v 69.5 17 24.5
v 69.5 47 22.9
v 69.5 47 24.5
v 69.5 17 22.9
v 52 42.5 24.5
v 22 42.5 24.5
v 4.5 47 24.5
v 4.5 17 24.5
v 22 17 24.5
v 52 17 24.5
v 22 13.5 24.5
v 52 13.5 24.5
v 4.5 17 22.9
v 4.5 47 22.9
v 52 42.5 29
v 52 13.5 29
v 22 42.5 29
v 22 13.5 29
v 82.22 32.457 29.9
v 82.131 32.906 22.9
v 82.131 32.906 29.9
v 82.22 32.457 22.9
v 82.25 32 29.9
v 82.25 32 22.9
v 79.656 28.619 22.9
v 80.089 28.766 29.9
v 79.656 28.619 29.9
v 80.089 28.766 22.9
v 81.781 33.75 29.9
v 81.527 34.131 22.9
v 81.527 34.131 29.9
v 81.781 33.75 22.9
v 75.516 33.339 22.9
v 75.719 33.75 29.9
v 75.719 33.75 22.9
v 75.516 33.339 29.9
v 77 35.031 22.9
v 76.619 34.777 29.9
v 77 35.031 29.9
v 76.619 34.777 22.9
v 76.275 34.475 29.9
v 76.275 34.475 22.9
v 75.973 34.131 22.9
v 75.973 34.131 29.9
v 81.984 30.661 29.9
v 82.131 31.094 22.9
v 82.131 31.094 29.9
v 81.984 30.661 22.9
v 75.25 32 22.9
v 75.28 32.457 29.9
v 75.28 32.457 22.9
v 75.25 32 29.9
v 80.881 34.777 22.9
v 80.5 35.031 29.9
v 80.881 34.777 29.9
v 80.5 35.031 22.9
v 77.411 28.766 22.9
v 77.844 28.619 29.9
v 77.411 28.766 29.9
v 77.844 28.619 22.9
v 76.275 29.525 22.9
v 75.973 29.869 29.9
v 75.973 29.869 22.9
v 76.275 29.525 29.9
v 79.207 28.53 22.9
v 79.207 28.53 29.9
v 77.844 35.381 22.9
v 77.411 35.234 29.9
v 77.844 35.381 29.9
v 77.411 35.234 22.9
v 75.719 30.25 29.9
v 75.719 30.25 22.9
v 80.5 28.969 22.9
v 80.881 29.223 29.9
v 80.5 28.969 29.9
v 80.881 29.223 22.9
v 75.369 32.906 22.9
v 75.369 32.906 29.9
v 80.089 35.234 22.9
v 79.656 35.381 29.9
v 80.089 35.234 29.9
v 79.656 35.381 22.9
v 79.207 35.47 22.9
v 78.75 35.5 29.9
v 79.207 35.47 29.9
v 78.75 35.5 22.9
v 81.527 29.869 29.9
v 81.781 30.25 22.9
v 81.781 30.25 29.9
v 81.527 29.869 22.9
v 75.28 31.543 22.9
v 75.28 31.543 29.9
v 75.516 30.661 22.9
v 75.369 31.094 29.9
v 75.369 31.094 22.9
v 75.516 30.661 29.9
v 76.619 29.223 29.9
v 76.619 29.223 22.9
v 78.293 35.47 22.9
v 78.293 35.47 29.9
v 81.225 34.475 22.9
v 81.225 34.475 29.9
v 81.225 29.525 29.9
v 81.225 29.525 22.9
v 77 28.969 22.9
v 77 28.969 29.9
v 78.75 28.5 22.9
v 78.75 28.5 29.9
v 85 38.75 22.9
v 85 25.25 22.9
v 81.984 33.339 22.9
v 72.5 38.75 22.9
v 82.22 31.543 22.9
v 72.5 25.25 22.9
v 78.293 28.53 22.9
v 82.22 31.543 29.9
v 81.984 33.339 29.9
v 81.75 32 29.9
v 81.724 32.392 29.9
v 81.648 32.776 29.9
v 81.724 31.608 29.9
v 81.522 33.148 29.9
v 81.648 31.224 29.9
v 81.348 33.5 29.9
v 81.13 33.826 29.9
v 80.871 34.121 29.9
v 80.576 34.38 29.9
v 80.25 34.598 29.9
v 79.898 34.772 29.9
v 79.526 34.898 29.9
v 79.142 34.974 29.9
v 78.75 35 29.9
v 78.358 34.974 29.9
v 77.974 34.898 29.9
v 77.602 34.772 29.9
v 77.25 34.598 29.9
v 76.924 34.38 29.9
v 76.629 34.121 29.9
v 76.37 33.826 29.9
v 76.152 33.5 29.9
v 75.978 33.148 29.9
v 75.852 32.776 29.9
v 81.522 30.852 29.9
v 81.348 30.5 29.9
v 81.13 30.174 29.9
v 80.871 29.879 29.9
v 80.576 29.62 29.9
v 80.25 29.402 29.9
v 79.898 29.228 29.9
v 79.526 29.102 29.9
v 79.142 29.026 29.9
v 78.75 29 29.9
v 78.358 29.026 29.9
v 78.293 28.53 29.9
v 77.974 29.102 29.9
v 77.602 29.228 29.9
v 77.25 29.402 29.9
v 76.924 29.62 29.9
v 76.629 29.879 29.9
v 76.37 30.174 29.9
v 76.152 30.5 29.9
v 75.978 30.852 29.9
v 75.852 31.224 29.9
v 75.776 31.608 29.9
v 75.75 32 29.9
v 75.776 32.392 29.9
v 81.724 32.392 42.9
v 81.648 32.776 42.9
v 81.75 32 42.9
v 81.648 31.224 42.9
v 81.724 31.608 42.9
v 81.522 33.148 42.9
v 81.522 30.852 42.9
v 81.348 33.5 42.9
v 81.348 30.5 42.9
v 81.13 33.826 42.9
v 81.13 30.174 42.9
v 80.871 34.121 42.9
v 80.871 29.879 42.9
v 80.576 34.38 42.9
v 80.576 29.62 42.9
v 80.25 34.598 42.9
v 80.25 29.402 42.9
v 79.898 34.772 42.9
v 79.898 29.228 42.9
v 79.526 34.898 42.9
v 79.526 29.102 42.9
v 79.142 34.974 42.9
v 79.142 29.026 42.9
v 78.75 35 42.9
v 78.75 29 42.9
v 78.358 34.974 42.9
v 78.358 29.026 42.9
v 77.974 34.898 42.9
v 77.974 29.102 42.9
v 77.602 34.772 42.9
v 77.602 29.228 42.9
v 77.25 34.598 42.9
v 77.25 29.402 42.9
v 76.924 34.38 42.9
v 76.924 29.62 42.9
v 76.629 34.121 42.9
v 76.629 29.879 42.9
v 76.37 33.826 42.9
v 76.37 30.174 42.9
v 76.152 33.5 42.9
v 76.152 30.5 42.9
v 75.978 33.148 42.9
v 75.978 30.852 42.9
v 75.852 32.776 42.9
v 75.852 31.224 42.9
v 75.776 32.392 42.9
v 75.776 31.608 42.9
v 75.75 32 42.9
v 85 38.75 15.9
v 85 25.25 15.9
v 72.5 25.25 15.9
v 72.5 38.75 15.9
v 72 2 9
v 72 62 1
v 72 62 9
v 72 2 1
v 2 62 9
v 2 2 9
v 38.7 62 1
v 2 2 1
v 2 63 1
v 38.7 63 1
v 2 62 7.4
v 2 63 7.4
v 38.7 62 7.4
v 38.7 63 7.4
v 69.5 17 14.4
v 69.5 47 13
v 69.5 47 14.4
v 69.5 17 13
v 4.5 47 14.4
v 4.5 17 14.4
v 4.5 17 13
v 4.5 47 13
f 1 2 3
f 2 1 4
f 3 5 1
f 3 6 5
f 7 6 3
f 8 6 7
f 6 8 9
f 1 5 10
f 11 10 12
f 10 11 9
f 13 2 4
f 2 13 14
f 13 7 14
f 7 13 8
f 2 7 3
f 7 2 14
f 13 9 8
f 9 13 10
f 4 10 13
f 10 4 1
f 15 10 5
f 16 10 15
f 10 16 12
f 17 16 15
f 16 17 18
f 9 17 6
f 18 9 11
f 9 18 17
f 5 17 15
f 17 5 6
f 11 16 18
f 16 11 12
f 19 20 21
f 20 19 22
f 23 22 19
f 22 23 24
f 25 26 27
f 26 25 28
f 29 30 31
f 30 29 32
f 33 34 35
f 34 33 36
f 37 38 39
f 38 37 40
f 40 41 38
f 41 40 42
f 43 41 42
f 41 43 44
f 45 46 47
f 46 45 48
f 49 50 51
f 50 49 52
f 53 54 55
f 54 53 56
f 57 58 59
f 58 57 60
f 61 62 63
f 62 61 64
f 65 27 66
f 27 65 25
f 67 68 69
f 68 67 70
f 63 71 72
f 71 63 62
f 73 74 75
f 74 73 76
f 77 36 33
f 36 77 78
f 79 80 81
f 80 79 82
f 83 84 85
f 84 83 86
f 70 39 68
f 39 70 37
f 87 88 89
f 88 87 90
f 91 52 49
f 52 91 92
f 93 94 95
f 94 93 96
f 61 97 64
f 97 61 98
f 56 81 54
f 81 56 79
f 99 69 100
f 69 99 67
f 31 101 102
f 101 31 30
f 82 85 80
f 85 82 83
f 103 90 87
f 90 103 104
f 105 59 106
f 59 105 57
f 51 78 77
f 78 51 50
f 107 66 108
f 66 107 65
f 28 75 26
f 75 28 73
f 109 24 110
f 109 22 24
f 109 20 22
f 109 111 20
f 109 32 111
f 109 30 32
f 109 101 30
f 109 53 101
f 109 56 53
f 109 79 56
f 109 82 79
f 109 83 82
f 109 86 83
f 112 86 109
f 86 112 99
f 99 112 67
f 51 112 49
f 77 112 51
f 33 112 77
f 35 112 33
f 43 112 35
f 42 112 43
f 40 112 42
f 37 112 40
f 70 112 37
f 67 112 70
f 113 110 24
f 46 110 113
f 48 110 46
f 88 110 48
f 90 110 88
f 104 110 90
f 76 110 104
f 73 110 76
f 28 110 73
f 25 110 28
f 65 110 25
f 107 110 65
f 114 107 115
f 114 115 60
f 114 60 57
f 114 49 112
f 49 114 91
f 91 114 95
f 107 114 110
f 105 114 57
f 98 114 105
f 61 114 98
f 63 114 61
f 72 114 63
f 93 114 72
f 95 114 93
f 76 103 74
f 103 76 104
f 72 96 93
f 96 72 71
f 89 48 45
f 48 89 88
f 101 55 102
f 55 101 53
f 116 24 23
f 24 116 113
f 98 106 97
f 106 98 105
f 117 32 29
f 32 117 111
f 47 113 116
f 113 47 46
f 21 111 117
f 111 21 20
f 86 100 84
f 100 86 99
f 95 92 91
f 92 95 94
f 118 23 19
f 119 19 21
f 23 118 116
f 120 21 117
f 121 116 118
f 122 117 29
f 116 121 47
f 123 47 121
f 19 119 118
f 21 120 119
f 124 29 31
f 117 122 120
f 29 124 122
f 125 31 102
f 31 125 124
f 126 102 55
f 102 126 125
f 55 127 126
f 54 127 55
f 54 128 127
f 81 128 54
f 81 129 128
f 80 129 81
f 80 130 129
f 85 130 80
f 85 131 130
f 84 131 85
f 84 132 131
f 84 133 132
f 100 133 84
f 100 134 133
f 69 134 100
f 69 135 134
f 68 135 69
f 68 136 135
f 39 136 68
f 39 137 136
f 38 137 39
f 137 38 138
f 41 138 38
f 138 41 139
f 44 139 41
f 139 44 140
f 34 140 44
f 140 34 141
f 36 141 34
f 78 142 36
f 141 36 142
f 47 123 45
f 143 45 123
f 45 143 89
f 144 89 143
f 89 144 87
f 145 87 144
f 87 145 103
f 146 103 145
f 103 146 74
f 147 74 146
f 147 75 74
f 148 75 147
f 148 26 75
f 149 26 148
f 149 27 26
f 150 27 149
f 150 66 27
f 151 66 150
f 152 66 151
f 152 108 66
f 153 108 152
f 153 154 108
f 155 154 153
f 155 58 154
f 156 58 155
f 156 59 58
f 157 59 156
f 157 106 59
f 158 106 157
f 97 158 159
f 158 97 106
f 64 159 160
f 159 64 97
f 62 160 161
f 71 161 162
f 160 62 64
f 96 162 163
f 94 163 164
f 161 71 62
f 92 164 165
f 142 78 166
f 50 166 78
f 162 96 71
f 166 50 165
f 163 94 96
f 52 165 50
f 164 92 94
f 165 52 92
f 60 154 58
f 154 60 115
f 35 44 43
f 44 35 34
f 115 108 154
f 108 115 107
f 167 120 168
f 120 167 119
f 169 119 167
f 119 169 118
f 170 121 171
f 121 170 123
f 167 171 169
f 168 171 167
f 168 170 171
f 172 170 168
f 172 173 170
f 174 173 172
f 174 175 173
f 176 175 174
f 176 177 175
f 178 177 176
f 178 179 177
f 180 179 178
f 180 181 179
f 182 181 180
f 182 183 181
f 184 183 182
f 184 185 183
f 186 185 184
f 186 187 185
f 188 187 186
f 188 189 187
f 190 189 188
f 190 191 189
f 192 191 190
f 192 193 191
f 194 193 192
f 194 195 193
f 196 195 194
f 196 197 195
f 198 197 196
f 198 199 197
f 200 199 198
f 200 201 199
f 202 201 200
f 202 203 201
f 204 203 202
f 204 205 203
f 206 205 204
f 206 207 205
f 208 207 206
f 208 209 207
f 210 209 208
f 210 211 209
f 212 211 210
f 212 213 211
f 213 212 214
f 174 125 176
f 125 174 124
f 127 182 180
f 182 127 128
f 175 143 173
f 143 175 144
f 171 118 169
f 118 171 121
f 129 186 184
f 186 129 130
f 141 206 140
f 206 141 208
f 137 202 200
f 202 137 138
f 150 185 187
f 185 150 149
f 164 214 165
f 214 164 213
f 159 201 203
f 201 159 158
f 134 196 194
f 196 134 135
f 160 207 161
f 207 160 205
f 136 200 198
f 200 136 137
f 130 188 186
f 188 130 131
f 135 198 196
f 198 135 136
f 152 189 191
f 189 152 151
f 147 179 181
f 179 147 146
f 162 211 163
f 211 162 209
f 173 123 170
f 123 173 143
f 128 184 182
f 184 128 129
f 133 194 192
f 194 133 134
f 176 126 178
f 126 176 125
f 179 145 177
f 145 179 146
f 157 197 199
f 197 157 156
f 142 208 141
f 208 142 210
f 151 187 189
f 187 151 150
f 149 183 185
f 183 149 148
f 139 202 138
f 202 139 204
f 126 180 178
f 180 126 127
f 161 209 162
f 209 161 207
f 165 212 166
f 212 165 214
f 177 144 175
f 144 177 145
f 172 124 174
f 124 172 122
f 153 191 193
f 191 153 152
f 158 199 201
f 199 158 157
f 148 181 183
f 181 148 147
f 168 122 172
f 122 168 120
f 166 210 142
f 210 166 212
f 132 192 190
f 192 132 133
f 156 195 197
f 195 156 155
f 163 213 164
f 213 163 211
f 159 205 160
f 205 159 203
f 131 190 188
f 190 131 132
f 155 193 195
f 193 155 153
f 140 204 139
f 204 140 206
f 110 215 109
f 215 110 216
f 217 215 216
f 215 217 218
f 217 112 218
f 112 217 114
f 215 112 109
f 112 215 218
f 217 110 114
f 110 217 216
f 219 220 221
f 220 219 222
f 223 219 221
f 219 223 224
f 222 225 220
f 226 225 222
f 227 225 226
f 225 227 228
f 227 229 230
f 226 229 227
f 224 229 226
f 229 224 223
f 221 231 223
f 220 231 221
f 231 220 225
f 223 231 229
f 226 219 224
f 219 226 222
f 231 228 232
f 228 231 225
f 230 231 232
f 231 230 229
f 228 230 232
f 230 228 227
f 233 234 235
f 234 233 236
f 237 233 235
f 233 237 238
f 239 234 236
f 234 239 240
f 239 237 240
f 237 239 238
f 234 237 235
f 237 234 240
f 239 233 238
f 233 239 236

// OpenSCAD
// theodio — portable podcast reader enclosure
//
// Parametric two-shell case for Pi Zero 2 W + Whisplay HAT + 4000 mAh LiPo.
// All dimensions in mm.
//
// First-pass design from datasheets only — many positions are estimates
// until the breadboard prototype confirms them. Look for `TODO` comments.
//
// Render:
//   openscad -o assembly.stl -D 'part="assembly"' enclosure.scad
//   openscad -o top.stl      -D 'part="top"'      enclosure.scad
//   openscad -o bottom.stl   -D 'part="bottom"'   enclosure.scad
//
// Open in the GUI with the default (`assembly`) to visualise component fit
// with the shell rendered transparent.

part = "assembly";  // "top" | "bottom" | "both" | "assembly"
$fn = 48;

// ============================================================
// Component dimensions
// ============================================================

// --- Raspberry Pi Zero 2 W (datasheet) ---
pi_w        = 65;
pi_d        = 30;
pi_pcb_h    = 1.4;
pi_hole_d   = 2.75;
pi_hole_pitch_w = 58;     // 3.5 mm in from each long edge
pi_hole_pitch_d = 23;     // 3.5 mm in from each short edge

// --- PiSugar Whisplay HAT ---
// Same 65×30 PCB footprint, stacks on the 40-pin header.
hat_pcb_h         = 1.6;
hat_components_h  = 4.5;    // TODO measure: LCD bezel + connectors
gpio_header_h     = 8.5;    // stacking header
// LCD visible aperture (1.69" IPS, ~30×37 mm).
// TODO confirm centre offset on the PCB from the Whisplay schematic.
lcd_w        = 30;
lcd_d        = 37;
lcd_off_x    = 0;           // shift from HAT centre, +x toward microSD side
lcd_off_y    = 0;

// --- 4000 mAh LiPo cell ---
lipo_w = 70;
lipo_d = 60;
lipo_h = 8;

// --- Adafruit PowerBoost 1000C ---
pb_w = 36.7;
pb_d = 22.6;
pb_h = 6.4;

// --- EC11 rotary encoder (typical alps-clone) ---
enc_body_w   = 12.5;
enc_body_d   = 13.5;
enc_body_h   = 7.0;
enc_thread_d = 7.0;         // panel-mount thread
enc_thread_h = 7.0;
enc_shaft_d  = 6.0;
enc_shaft_h  = 13.0;

// --- Misc ---
tact_d       = 6.5;         // power tactile switch panel diameter
phone_jack_d = 6.5;         // 3.5 mm jack panel hole
microsd_w    = 12.5;
microsd_h    = 2.5;

// ============================================================
// Case parameters
// ============================================================

wall       = 2.0;
tol        = 0.3;           // print/fit clearance
foam_pad   = 1.0;           // soft pad under the LiPo
pi_riser   = 4.0;           // standoff between LiPo top and Pi PCB bottom

// Internal cavity origin = inside bottom-back-left corner of the case.
// All component positions below are inside this cavity frame.
cavity_w = lipo_w + 4;                     // ~74
cavity_d = lipo_d + 4;                     // ~64
inner_stack_h = foam_pad + lipo_h + pi_riser
              + pi_pcb_h + gpio_header_h
              + hat_pcb_h + hat_components_h + 2;
cavity_h = inner_stack_h;                  // ~38
echo("Internal cavity:", cavity_w, cavity_d, cavity_h);

// Z layout (heights above the cavity floor)
z_lipo  = foam_pad;
z_pi    = z_lipo + lipo_h + pi_riser;
z_hat   = z_pi + pi_pcb_h + gpio_header_h;
z_lcd_top = z_hat + hat_pcb_h + hat_components_h;

// Pi XY position inside the cavity (centred)
pi_x = (cavity_w - pi_w) / 2;
pi_y = (cavity_d - pi_d) / 2;

// LiPo centred on the floor
lipo_x = (cavity_w - lipo_w) / 2;
lipo_y = (cavity_d - lipo_d) / 2;

// PowerBoost sits flat next to the LiPo, against the back wall
pb_x = 2;
pb_y = cavity_d - pb_d - 1;

// Encoder column: between the Pi+HAT stack and the case's short edge.
// TODO confirm there's actually room here once the LCD aperture is set.
enc_col_x = pi_x + pi_w + 3;
enc_col_y = (cavity_d - enc_body_d) / 2;
enc_col_z = z_hat - enc_body_h;            // hangs from the top shell

// Split plane between top and bottom shells.
// Bottom holds the LiPo, PowerBoost, and Pi. Top holds the HAT, LCD, and
// encoder. The split runs just above the Pi PCB so the GPIO header
// remains accessible from the top shell.
split_z = z_pi + pi_pcb_h + 1;

// ============================================================
// Component proxies (for the assembly view)
// ============================================================

module pi_zero() {
    color("MediumSeaGreen") cube([pi_w, pi_d, pi_pcb_h]);
}

module whisplay_hat() {
    color("Black") cube([pi_w, pi_d, hat_pcb_h]);
    translate([(pi_w - lcd_w)/2 + lcd_off_x,
               (pi_d - lcd_d)/2 + lcd_off_y,
               hat_pcb_h])
        color("White") cube([lcd_w, min(lcd_d, pi_d - 1), hat_components_h]);
}

module lipo() { color("Silver") cube([lipo_w, lipo_d, lipo_h]); }

module powerboost() { color("Magenta") cube([pb_w, pb_d, pb_h]); }

module encoder() {
    color("DimGray") {
        cube([enc_body_w, enc_body_d, enc_body_h]);
        translate([enc_body_w/2, enc_body_d/2, enc_body_h]) {
            cylinder(h=enc_thread_h, d=enc_thread_d);
            translate([0, 0, enc_thread_h])
                cylinder(h=enc_shaft_h, d=enc_shaft_d);
        }
    }
}

// ============================================================
// Case construction
// ============================================================

module case_outer() {
    translate([-wall, -wall, -wall])
        cube([cavity_w + 2*wall, cavity_d + 2*wall, cavity_h + 2*wall]);
}

module case_cavity() {
    cube([cavity_w, cavity_d, cavity_h]);
}

module pi_standoffs() {
    sx0 = pi_x + (pi_w - pi_hole_pitch_w)/2;
    sy0 = pi_y + (pi_d - pi_hole_pitch_d)/2;
    for (x = [sx0, sx0 + pi_hole_pitch_w])
        for (y = [sy0, sy0 + pi_hole_pitch_d])
            translate([x, y, 0])
                difference() {
                    cylinder(h=z_pi, d=5);
                    translate([0, 0, z_pi - 4.5])
                        cylinder(h=4.6, d=pi_hole_d);
                }
}

// --- Panel cutouts ---

module lcd_window() {
    // Through the top wall, above the HAT's LCD bezel.
    translate([pi_x + (pi_w - lcd_w)/2 + lcd_off_x,
               pi_y + (pi_d - lcd_d)/2 + lcd_off_y,
               cavity_h - 0.1])
        cube([lcd_w, min(lcd_d, pi_d - 1), wall + 0.2]);
}

module encoder_hole() {
    // Encoder thread pokes through the top, knob sits above the case.
    translate([enc_col_x + enc_body_w/2,
               enc_col_y + enc_body_d/2,
               cavity_h - 0.1])
        cylinder(h=wall + 0.2, d=enc_thread_d + tol);
}

module power_switch_hole() {
    // Right short edge, at mid-height of the HAT stack.
    translate([cavity_w + 0.1, 6, z_pi + 2])
        rotate([0, -90, 0])
        cylinder(h=wall + 0.2, d=tact_d + tol);
}

module headphone_jack_hole() {
    // Front long edge, where the Whisplay's audio output sits.
    // TODO: confirm position once we know whether the HAT exposes a
    // panel-mount jack or pads + flying-lead jack.
    translate([10, -0.1, z_hat + 2])
        rotate([-90, 0, 0])
        cylinder(h=wall + 0.2, d=phone_jack_d + tol);
}

module microsd_slot() {
    // Left short edge, aligned with the Pi's microSD card.
    translate([-wall - 0.1, pi_y + 2.5, z_pi - microsd_h/2])
        cube([wall + 0.2, microsd_w, microsd_h + 2*tol]);
}

// --- Shells ---

module full_shell() {
    difference() {
        case_outer();
        case_cavity();
        lcd_window();
        encoder_hole();
        power_switch_hole();
        headphone_jack_hole();
        microsd_slot();
    }
}

module bottom_shell() {
    difference() {
        full_shell();
        translate([-wall - 1, -wall - 1, split_z])
            cube([cavity_w + 2*wall + 2,
                  cavity_d + 2*wall + 2,
                  cavity_h + 2*wall + 2]);
    }
    pi_standoffs();
}

module top_shell() {
    difference() {
        full_shell();
        translate([-wall - 1, -wall - 1, -wall - 1])
            cube([cavity_w + 2*wall + 2,
                  cavity_d + 2*wall + 2,
                  split_z + wall + 1]);
    }
}

module assembly() {
    %full_shell();   // transparent shell
    translate([lipo_x, lipo_y, z_lipo]) lipo();
    translate([pb_x,   pb_y,   z_lipo]) powerboost();
    translate([pi_x,   pi_y,   z_pi])   pi_zero();
    translate([pi_x,   pi_y,   z_hat])  whisplay_hat();
    translate([enc_col_x, enc_col_y, enc_col_z]) encoder();
}

// ============================================================
// Render dispatch
// ============================================================
if      (part == "assembly") assembly();
else if (part == "top")      top_shell();
else if (part == "bottom")   bottom_shell();
else if (part == "both") {
    bottom_shell();
    translate([cavity_w + 2*wall + 20, 0, 0]) top_shell();
}
